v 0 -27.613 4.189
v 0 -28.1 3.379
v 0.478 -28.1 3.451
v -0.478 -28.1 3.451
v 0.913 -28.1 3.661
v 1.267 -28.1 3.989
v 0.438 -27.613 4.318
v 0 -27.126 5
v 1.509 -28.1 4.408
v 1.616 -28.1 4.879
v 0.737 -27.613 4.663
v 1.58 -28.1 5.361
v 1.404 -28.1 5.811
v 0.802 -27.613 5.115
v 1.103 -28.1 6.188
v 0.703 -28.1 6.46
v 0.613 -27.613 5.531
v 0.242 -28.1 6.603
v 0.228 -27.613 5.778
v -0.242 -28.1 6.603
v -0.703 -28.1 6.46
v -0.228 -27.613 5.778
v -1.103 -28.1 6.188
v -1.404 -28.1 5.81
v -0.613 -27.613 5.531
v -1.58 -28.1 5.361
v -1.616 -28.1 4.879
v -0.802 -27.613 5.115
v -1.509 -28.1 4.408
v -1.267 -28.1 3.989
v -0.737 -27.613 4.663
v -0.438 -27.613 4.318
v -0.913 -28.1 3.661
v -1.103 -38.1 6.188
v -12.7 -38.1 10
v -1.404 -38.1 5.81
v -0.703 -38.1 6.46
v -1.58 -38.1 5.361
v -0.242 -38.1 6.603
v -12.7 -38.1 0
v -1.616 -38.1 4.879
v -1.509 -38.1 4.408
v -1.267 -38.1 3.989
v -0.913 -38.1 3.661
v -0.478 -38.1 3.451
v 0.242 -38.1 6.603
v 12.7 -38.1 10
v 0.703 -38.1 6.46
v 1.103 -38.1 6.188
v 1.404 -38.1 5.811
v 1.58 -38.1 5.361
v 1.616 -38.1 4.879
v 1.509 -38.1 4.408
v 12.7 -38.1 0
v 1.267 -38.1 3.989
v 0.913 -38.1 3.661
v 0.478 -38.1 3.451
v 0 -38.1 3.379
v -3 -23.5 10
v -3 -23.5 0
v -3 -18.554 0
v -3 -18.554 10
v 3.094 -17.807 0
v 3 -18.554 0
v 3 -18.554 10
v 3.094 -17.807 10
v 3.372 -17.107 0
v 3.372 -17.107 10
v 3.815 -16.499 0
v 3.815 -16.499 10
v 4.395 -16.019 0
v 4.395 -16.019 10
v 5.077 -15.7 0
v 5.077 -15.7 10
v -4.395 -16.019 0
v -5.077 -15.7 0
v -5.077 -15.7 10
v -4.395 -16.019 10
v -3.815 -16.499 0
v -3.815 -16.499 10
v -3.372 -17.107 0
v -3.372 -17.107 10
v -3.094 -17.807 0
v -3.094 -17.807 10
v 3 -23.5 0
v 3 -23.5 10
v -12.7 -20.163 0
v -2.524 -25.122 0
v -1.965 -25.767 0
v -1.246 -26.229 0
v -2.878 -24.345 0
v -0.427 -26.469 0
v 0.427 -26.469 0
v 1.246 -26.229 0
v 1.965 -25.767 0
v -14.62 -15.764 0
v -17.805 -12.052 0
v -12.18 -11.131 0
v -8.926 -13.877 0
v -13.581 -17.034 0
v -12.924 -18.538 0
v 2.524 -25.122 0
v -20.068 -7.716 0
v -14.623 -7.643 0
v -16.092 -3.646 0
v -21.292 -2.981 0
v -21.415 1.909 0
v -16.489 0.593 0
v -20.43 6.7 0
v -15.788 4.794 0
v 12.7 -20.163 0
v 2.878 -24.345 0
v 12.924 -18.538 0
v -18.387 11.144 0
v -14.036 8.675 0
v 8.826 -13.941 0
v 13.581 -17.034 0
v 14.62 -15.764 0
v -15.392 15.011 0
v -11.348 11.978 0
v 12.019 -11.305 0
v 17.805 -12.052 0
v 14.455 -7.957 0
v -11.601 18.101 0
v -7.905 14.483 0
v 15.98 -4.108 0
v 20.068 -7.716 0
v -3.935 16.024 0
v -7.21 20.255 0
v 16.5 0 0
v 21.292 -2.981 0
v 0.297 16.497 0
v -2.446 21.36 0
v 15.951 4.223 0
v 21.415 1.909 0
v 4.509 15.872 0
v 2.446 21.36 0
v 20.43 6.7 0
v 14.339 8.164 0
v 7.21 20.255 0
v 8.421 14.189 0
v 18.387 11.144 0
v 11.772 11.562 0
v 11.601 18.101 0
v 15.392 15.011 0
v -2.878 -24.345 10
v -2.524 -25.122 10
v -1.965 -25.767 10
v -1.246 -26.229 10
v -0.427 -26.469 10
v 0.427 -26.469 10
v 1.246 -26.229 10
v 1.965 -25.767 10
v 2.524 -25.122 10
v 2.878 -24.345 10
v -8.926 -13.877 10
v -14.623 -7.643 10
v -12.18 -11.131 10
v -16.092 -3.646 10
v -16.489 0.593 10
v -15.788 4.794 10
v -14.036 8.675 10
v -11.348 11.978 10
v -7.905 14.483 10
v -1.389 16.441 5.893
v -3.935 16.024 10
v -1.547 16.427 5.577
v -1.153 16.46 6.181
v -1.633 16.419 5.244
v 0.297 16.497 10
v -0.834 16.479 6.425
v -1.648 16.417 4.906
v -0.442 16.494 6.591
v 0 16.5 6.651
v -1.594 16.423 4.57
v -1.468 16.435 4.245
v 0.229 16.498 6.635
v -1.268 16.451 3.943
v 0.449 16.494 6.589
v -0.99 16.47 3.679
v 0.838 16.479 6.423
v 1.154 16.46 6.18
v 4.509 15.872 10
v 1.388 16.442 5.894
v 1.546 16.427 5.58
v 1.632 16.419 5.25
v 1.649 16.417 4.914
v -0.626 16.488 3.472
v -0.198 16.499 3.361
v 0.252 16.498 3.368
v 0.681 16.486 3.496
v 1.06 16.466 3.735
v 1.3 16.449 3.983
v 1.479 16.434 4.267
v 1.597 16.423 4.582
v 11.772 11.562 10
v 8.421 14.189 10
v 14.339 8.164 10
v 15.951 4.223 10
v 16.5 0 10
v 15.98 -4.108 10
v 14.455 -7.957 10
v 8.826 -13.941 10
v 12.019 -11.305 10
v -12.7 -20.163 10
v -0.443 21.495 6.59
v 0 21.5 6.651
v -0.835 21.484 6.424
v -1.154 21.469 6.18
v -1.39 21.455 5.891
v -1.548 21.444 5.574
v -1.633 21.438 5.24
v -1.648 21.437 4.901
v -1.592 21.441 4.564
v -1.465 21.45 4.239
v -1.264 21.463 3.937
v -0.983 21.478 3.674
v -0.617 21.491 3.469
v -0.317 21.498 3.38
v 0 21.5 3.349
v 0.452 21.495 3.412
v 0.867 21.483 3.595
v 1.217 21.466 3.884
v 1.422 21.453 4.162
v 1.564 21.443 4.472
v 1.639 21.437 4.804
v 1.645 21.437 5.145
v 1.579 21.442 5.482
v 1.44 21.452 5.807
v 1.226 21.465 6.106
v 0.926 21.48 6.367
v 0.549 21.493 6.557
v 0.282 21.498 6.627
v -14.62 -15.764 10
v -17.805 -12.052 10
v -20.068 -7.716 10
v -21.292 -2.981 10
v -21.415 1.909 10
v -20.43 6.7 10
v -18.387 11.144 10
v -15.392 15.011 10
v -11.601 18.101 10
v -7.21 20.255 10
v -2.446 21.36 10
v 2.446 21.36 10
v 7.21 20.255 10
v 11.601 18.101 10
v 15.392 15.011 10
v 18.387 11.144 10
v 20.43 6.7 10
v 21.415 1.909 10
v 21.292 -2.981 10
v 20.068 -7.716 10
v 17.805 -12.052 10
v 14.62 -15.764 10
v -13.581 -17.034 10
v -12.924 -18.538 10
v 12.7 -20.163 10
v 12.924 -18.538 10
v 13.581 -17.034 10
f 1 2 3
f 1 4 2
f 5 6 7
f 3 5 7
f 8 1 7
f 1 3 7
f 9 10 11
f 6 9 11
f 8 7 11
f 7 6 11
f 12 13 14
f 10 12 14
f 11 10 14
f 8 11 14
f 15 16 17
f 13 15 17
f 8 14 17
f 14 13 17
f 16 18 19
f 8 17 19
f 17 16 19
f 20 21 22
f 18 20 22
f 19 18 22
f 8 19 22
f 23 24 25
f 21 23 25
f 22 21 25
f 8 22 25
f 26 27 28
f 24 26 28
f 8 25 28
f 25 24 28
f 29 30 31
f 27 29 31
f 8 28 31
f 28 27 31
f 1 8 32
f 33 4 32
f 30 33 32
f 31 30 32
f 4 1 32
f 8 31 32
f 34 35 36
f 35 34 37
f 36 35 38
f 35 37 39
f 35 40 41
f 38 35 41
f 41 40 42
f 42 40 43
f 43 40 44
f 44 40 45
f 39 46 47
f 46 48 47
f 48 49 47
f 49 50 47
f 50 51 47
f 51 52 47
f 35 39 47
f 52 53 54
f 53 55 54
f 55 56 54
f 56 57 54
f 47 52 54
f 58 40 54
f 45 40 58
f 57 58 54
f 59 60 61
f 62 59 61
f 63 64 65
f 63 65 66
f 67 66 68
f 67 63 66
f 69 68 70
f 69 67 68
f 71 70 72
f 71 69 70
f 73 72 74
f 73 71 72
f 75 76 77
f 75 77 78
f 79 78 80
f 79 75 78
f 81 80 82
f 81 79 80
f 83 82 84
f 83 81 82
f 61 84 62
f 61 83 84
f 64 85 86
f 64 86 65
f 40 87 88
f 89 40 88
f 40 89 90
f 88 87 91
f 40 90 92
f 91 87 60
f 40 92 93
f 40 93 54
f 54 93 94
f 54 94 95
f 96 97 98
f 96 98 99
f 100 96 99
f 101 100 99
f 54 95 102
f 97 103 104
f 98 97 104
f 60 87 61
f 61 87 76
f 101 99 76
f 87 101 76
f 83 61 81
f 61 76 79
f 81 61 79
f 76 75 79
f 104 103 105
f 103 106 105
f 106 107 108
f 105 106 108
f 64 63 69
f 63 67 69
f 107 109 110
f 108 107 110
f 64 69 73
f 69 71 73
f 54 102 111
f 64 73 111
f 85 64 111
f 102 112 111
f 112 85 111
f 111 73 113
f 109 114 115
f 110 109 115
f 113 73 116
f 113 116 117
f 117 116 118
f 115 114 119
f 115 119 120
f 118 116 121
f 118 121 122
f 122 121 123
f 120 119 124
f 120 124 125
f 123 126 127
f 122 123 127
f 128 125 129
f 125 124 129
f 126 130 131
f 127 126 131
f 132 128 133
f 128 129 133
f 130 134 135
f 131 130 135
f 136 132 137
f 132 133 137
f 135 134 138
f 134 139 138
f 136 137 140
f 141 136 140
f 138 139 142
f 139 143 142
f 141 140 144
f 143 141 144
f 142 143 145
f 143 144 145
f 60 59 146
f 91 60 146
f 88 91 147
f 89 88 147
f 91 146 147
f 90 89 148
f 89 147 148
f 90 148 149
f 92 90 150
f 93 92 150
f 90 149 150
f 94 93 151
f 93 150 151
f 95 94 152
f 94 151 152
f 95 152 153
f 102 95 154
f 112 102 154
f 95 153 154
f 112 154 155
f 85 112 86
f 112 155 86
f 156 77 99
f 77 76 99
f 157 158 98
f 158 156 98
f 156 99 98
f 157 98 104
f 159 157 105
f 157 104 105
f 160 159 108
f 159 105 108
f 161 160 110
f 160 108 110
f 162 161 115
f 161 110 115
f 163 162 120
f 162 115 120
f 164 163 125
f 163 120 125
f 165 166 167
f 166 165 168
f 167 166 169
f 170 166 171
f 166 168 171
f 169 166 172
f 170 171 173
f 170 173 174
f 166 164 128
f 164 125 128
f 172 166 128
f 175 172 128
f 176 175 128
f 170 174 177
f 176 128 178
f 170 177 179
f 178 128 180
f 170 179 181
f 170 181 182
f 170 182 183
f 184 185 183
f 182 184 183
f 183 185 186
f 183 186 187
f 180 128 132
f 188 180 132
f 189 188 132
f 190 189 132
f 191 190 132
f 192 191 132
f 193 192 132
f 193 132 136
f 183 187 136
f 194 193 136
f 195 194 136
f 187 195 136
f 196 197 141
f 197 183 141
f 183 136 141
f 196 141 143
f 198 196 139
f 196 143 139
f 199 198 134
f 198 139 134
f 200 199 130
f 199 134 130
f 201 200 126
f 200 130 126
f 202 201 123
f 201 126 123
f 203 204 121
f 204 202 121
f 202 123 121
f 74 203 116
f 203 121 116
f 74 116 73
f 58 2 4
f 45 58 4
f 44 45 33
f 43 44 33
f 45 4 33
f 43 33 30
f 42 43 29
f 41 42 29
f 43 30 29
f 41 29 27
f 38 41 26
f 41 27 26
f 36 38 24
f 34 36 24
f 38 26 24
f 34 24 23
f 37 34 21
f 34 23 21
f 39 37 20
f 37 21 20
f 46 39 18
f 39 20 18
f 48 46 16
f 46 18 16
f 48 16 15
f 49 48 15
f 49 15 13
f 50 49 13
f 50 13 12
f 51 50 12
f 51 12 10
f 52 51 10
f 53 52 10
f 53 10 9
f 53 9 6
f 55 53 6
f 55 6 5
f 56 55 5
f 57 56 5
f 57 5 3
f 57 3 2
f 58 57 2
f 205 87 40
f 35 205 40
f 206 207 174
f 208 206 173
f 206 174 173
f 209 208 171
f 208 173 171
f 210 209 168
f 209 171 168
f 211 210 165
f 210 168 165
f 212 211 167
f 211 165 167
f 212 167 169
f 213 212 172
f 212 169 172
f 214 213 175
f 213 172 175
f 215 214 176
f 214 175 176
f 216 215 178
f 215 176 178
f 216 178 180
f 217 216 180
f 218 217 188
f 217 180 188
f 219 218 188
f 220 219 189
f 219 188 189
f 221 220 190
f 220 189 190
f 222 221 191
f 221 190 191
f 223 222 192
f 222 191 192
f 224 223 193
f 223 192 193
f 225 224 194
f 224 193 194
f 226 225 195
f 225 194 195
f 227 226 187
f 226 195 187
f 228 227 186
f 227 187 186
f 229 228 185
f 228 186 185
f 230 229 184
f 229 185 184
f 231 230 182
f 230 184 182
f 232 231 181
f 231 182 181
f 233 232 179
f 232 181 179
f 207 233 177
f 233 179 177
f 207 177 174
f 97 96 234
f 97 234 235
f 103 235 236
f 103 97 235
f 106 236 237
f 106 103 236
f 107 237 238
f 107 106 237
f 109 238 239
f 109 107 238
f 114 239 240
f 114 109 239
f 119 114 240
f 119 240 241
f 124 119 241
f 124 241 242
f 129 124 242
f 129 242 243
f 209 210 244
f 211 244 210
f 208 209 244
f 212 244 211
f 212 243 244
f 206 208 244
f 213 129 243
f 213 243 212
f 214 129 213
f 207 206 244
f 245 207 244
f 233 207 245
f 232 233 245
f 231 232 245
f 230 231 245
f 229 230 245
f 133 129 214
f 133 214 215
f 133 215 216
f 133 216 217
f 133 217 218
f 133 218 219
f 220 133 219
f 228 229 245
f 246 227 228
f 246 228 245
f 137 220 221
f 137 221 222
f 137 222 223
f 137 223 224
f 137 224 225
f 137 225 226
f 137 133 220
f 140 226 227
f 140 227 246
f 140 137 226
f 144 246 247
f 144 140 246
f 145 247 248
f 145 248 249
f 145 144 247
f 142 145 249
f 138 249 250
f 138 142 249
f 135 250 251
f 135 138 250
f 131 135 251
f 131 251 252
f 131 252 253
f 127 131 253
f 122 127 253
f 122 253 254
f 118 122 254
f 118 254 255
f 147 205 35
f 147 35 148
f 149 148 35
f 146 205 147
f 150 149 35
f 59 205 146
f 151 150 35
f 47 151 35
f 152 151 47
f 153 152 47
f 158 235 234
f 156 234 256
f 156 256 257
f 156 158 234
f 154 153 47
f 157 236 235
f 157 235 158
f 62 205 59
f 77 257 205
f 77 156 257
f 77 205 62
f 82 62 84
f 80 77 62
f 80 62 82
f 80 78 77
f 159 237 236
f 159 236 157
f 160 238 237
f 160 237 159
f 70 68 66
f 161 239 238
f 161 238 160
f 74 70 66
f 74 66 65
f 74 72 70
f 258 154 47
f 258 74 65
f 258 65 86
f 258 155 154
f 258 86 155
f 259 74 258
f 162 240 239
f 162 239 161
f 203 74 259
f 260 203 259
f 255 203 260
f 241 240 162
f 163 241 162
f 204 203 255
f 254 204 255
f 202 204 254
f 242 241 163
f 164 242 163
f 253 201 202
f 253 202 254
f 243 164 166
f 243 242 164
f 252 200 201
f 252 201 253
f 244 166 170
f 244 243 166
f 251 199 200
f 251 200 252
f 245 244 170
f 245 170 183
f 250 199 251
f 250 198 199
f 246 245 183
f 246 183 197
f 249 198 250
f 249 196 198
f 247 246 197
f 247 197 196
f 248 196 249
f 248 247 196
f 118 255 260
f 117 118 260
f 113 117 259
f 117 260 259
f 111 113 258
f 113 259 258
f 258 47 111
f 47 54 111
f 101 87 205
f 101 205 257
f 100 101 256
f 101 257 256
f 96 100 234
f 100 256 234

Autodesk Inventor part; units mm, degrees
ref_plane "YZ Plane" through (0, 0, 0) normal (1, 0, 0) x (0, 1, 0)
sketch "Sketch1" plane through (0, 0, 0) normal (0, 0, 1) x (1, 0, 0)
  circle A0 centre (0, 0) radius 15 construction
  circle A1 centre (0, 0) radius 16.5
  circle A2 centre (0, 0) radius 21.5
  line L0 (0, 0) -> (26.2932, 0) construction
  line L1 (0, 0) -> (0, -21.5) construction
  line L2 (-12.7, -38.1) -> (12.7, -38.1)
  line L3 (12.7, -38.1) -> (12.7, -17.3482)
  line L4 (12.7, -17.3482) -> (-12.7, -17.3482)
  line L5 (-12.7, -17.3482) -> (-12.7, -38.1)
  line L6 (-12.7, -38.1) -> (12.7, -17.3482) construction
  line L7 (12.7, -38.1) -> (-12.7, -17.3482) construction
  point P0 (0, -27.7241)
  point P1 (0, -27.7241)
  dimension "d0" = 30
  dimension "d1" = 33
  dimension "d2" = 43
  dimension "d7" = 25.4
  dimension "d8" = 38.1
extrude "Extrusion1" add sketch "Sketch1" along normal blind 10
fillet "Fillet2" radius 6 2 edges at (12.7, -17.3482, 5) (-12.7, -17.3482, 5)
sketch "Sketch3" plane through (-12.7, -38.1, 0) normal (0, -1, 0) x (1, 0, 0)
  line L0 (0, 0) -> (0, 10) projected
  line L1 (12.7, 0) -> (12.7, 10) construction
  line L2 (-3.8, 10) -> (29.2, 10) construction
  line L3 (0, 5) -> (25.4, 5) construction
  line L4 (25.4, 10) -> (25.4, 0) construction
  point P0 (0.8561, 10)
  point P1 (24.5439, 10)
  point P2 (12.7, 5)
hole "Hole1" at (0, -38.1, 5) direction (0, 1, 0) diameter 3.242 depth 10 tip angle 118 thread size "M4x0.7" class "6H" standard "ANSI Metric M Profile"
ref_plane "Work Plane1" through (0, 21.5, 0) normal (0, 1, 0) x (-1, 0, 0)
sketch "Sketch4" plane through (0, 21.5, 0) normal (0, 1, 0) x (-1, 0, 0)
  line L0 (0, 0) -> (0, 10) construction
  line L1 (12.7, 10) -> (-12.7, 10) construction
  circle A0 centre (0, 5) radius 1.621 construction
  point P0 (0, 5)
hole "Hole2" at (0, 21.5, 5) direction (0, -1, 0) diameter 3.302 depth 12.3 tip angle 118 thread size "8-32 UNC" class "2B" standard "ANSI Unified Screw Threads"
sketch "Sketch5" plane through (0, 0, 10) normal (0, 0, 1) x (1, 0, 0)
  circle A0 centre (0, 0) radius 16.5 projected
  arc A1 (14.62, -15.7641) -> (-14.62, -15.7641) centre (0, 0) ccw projected
  line L0 (0, 0) -> (0, -38.1) construction
  line L1 (1.621, -38.1) -> (-1.621, -38.1) construction
  circle A2 centre (0, -23.5) radius 3
  line L2 (-3, -23.5) -> (-3, -16.225)
  line L3 (3, -23.5) -> (3, -16.225)
  line L4 (-12.7, -20.1633) -> (-12.7, -38.1) projected
  line L5 (12.7, -38.1) -> (12.7, -20.1633) projected
  line L6 (-12.7, -26.5) -> (12.7, -26.5) construction
  line L7 (12.7, -38.1) -> (12.7, -20.1633) construction
  line L8 (-10.4966, -16.5) -> (9.259, -16.5) construction
  dimension "d28" = 6
  dimension "d32" = 10
extrude "Extrusion3" cut sketch "Sketch5" against normal through all contours A0 L3 A2 L2 | A2
fillet "Fillet4" radius 3 2 edges at (-3, -16.225, 5) (3, -16.225, 5)
ref_plane "Work Plane2" through (0, 0, 5) normal (0, 0, 1) x (1, 0, 0)
properties part number "LaserTubeClamp"
